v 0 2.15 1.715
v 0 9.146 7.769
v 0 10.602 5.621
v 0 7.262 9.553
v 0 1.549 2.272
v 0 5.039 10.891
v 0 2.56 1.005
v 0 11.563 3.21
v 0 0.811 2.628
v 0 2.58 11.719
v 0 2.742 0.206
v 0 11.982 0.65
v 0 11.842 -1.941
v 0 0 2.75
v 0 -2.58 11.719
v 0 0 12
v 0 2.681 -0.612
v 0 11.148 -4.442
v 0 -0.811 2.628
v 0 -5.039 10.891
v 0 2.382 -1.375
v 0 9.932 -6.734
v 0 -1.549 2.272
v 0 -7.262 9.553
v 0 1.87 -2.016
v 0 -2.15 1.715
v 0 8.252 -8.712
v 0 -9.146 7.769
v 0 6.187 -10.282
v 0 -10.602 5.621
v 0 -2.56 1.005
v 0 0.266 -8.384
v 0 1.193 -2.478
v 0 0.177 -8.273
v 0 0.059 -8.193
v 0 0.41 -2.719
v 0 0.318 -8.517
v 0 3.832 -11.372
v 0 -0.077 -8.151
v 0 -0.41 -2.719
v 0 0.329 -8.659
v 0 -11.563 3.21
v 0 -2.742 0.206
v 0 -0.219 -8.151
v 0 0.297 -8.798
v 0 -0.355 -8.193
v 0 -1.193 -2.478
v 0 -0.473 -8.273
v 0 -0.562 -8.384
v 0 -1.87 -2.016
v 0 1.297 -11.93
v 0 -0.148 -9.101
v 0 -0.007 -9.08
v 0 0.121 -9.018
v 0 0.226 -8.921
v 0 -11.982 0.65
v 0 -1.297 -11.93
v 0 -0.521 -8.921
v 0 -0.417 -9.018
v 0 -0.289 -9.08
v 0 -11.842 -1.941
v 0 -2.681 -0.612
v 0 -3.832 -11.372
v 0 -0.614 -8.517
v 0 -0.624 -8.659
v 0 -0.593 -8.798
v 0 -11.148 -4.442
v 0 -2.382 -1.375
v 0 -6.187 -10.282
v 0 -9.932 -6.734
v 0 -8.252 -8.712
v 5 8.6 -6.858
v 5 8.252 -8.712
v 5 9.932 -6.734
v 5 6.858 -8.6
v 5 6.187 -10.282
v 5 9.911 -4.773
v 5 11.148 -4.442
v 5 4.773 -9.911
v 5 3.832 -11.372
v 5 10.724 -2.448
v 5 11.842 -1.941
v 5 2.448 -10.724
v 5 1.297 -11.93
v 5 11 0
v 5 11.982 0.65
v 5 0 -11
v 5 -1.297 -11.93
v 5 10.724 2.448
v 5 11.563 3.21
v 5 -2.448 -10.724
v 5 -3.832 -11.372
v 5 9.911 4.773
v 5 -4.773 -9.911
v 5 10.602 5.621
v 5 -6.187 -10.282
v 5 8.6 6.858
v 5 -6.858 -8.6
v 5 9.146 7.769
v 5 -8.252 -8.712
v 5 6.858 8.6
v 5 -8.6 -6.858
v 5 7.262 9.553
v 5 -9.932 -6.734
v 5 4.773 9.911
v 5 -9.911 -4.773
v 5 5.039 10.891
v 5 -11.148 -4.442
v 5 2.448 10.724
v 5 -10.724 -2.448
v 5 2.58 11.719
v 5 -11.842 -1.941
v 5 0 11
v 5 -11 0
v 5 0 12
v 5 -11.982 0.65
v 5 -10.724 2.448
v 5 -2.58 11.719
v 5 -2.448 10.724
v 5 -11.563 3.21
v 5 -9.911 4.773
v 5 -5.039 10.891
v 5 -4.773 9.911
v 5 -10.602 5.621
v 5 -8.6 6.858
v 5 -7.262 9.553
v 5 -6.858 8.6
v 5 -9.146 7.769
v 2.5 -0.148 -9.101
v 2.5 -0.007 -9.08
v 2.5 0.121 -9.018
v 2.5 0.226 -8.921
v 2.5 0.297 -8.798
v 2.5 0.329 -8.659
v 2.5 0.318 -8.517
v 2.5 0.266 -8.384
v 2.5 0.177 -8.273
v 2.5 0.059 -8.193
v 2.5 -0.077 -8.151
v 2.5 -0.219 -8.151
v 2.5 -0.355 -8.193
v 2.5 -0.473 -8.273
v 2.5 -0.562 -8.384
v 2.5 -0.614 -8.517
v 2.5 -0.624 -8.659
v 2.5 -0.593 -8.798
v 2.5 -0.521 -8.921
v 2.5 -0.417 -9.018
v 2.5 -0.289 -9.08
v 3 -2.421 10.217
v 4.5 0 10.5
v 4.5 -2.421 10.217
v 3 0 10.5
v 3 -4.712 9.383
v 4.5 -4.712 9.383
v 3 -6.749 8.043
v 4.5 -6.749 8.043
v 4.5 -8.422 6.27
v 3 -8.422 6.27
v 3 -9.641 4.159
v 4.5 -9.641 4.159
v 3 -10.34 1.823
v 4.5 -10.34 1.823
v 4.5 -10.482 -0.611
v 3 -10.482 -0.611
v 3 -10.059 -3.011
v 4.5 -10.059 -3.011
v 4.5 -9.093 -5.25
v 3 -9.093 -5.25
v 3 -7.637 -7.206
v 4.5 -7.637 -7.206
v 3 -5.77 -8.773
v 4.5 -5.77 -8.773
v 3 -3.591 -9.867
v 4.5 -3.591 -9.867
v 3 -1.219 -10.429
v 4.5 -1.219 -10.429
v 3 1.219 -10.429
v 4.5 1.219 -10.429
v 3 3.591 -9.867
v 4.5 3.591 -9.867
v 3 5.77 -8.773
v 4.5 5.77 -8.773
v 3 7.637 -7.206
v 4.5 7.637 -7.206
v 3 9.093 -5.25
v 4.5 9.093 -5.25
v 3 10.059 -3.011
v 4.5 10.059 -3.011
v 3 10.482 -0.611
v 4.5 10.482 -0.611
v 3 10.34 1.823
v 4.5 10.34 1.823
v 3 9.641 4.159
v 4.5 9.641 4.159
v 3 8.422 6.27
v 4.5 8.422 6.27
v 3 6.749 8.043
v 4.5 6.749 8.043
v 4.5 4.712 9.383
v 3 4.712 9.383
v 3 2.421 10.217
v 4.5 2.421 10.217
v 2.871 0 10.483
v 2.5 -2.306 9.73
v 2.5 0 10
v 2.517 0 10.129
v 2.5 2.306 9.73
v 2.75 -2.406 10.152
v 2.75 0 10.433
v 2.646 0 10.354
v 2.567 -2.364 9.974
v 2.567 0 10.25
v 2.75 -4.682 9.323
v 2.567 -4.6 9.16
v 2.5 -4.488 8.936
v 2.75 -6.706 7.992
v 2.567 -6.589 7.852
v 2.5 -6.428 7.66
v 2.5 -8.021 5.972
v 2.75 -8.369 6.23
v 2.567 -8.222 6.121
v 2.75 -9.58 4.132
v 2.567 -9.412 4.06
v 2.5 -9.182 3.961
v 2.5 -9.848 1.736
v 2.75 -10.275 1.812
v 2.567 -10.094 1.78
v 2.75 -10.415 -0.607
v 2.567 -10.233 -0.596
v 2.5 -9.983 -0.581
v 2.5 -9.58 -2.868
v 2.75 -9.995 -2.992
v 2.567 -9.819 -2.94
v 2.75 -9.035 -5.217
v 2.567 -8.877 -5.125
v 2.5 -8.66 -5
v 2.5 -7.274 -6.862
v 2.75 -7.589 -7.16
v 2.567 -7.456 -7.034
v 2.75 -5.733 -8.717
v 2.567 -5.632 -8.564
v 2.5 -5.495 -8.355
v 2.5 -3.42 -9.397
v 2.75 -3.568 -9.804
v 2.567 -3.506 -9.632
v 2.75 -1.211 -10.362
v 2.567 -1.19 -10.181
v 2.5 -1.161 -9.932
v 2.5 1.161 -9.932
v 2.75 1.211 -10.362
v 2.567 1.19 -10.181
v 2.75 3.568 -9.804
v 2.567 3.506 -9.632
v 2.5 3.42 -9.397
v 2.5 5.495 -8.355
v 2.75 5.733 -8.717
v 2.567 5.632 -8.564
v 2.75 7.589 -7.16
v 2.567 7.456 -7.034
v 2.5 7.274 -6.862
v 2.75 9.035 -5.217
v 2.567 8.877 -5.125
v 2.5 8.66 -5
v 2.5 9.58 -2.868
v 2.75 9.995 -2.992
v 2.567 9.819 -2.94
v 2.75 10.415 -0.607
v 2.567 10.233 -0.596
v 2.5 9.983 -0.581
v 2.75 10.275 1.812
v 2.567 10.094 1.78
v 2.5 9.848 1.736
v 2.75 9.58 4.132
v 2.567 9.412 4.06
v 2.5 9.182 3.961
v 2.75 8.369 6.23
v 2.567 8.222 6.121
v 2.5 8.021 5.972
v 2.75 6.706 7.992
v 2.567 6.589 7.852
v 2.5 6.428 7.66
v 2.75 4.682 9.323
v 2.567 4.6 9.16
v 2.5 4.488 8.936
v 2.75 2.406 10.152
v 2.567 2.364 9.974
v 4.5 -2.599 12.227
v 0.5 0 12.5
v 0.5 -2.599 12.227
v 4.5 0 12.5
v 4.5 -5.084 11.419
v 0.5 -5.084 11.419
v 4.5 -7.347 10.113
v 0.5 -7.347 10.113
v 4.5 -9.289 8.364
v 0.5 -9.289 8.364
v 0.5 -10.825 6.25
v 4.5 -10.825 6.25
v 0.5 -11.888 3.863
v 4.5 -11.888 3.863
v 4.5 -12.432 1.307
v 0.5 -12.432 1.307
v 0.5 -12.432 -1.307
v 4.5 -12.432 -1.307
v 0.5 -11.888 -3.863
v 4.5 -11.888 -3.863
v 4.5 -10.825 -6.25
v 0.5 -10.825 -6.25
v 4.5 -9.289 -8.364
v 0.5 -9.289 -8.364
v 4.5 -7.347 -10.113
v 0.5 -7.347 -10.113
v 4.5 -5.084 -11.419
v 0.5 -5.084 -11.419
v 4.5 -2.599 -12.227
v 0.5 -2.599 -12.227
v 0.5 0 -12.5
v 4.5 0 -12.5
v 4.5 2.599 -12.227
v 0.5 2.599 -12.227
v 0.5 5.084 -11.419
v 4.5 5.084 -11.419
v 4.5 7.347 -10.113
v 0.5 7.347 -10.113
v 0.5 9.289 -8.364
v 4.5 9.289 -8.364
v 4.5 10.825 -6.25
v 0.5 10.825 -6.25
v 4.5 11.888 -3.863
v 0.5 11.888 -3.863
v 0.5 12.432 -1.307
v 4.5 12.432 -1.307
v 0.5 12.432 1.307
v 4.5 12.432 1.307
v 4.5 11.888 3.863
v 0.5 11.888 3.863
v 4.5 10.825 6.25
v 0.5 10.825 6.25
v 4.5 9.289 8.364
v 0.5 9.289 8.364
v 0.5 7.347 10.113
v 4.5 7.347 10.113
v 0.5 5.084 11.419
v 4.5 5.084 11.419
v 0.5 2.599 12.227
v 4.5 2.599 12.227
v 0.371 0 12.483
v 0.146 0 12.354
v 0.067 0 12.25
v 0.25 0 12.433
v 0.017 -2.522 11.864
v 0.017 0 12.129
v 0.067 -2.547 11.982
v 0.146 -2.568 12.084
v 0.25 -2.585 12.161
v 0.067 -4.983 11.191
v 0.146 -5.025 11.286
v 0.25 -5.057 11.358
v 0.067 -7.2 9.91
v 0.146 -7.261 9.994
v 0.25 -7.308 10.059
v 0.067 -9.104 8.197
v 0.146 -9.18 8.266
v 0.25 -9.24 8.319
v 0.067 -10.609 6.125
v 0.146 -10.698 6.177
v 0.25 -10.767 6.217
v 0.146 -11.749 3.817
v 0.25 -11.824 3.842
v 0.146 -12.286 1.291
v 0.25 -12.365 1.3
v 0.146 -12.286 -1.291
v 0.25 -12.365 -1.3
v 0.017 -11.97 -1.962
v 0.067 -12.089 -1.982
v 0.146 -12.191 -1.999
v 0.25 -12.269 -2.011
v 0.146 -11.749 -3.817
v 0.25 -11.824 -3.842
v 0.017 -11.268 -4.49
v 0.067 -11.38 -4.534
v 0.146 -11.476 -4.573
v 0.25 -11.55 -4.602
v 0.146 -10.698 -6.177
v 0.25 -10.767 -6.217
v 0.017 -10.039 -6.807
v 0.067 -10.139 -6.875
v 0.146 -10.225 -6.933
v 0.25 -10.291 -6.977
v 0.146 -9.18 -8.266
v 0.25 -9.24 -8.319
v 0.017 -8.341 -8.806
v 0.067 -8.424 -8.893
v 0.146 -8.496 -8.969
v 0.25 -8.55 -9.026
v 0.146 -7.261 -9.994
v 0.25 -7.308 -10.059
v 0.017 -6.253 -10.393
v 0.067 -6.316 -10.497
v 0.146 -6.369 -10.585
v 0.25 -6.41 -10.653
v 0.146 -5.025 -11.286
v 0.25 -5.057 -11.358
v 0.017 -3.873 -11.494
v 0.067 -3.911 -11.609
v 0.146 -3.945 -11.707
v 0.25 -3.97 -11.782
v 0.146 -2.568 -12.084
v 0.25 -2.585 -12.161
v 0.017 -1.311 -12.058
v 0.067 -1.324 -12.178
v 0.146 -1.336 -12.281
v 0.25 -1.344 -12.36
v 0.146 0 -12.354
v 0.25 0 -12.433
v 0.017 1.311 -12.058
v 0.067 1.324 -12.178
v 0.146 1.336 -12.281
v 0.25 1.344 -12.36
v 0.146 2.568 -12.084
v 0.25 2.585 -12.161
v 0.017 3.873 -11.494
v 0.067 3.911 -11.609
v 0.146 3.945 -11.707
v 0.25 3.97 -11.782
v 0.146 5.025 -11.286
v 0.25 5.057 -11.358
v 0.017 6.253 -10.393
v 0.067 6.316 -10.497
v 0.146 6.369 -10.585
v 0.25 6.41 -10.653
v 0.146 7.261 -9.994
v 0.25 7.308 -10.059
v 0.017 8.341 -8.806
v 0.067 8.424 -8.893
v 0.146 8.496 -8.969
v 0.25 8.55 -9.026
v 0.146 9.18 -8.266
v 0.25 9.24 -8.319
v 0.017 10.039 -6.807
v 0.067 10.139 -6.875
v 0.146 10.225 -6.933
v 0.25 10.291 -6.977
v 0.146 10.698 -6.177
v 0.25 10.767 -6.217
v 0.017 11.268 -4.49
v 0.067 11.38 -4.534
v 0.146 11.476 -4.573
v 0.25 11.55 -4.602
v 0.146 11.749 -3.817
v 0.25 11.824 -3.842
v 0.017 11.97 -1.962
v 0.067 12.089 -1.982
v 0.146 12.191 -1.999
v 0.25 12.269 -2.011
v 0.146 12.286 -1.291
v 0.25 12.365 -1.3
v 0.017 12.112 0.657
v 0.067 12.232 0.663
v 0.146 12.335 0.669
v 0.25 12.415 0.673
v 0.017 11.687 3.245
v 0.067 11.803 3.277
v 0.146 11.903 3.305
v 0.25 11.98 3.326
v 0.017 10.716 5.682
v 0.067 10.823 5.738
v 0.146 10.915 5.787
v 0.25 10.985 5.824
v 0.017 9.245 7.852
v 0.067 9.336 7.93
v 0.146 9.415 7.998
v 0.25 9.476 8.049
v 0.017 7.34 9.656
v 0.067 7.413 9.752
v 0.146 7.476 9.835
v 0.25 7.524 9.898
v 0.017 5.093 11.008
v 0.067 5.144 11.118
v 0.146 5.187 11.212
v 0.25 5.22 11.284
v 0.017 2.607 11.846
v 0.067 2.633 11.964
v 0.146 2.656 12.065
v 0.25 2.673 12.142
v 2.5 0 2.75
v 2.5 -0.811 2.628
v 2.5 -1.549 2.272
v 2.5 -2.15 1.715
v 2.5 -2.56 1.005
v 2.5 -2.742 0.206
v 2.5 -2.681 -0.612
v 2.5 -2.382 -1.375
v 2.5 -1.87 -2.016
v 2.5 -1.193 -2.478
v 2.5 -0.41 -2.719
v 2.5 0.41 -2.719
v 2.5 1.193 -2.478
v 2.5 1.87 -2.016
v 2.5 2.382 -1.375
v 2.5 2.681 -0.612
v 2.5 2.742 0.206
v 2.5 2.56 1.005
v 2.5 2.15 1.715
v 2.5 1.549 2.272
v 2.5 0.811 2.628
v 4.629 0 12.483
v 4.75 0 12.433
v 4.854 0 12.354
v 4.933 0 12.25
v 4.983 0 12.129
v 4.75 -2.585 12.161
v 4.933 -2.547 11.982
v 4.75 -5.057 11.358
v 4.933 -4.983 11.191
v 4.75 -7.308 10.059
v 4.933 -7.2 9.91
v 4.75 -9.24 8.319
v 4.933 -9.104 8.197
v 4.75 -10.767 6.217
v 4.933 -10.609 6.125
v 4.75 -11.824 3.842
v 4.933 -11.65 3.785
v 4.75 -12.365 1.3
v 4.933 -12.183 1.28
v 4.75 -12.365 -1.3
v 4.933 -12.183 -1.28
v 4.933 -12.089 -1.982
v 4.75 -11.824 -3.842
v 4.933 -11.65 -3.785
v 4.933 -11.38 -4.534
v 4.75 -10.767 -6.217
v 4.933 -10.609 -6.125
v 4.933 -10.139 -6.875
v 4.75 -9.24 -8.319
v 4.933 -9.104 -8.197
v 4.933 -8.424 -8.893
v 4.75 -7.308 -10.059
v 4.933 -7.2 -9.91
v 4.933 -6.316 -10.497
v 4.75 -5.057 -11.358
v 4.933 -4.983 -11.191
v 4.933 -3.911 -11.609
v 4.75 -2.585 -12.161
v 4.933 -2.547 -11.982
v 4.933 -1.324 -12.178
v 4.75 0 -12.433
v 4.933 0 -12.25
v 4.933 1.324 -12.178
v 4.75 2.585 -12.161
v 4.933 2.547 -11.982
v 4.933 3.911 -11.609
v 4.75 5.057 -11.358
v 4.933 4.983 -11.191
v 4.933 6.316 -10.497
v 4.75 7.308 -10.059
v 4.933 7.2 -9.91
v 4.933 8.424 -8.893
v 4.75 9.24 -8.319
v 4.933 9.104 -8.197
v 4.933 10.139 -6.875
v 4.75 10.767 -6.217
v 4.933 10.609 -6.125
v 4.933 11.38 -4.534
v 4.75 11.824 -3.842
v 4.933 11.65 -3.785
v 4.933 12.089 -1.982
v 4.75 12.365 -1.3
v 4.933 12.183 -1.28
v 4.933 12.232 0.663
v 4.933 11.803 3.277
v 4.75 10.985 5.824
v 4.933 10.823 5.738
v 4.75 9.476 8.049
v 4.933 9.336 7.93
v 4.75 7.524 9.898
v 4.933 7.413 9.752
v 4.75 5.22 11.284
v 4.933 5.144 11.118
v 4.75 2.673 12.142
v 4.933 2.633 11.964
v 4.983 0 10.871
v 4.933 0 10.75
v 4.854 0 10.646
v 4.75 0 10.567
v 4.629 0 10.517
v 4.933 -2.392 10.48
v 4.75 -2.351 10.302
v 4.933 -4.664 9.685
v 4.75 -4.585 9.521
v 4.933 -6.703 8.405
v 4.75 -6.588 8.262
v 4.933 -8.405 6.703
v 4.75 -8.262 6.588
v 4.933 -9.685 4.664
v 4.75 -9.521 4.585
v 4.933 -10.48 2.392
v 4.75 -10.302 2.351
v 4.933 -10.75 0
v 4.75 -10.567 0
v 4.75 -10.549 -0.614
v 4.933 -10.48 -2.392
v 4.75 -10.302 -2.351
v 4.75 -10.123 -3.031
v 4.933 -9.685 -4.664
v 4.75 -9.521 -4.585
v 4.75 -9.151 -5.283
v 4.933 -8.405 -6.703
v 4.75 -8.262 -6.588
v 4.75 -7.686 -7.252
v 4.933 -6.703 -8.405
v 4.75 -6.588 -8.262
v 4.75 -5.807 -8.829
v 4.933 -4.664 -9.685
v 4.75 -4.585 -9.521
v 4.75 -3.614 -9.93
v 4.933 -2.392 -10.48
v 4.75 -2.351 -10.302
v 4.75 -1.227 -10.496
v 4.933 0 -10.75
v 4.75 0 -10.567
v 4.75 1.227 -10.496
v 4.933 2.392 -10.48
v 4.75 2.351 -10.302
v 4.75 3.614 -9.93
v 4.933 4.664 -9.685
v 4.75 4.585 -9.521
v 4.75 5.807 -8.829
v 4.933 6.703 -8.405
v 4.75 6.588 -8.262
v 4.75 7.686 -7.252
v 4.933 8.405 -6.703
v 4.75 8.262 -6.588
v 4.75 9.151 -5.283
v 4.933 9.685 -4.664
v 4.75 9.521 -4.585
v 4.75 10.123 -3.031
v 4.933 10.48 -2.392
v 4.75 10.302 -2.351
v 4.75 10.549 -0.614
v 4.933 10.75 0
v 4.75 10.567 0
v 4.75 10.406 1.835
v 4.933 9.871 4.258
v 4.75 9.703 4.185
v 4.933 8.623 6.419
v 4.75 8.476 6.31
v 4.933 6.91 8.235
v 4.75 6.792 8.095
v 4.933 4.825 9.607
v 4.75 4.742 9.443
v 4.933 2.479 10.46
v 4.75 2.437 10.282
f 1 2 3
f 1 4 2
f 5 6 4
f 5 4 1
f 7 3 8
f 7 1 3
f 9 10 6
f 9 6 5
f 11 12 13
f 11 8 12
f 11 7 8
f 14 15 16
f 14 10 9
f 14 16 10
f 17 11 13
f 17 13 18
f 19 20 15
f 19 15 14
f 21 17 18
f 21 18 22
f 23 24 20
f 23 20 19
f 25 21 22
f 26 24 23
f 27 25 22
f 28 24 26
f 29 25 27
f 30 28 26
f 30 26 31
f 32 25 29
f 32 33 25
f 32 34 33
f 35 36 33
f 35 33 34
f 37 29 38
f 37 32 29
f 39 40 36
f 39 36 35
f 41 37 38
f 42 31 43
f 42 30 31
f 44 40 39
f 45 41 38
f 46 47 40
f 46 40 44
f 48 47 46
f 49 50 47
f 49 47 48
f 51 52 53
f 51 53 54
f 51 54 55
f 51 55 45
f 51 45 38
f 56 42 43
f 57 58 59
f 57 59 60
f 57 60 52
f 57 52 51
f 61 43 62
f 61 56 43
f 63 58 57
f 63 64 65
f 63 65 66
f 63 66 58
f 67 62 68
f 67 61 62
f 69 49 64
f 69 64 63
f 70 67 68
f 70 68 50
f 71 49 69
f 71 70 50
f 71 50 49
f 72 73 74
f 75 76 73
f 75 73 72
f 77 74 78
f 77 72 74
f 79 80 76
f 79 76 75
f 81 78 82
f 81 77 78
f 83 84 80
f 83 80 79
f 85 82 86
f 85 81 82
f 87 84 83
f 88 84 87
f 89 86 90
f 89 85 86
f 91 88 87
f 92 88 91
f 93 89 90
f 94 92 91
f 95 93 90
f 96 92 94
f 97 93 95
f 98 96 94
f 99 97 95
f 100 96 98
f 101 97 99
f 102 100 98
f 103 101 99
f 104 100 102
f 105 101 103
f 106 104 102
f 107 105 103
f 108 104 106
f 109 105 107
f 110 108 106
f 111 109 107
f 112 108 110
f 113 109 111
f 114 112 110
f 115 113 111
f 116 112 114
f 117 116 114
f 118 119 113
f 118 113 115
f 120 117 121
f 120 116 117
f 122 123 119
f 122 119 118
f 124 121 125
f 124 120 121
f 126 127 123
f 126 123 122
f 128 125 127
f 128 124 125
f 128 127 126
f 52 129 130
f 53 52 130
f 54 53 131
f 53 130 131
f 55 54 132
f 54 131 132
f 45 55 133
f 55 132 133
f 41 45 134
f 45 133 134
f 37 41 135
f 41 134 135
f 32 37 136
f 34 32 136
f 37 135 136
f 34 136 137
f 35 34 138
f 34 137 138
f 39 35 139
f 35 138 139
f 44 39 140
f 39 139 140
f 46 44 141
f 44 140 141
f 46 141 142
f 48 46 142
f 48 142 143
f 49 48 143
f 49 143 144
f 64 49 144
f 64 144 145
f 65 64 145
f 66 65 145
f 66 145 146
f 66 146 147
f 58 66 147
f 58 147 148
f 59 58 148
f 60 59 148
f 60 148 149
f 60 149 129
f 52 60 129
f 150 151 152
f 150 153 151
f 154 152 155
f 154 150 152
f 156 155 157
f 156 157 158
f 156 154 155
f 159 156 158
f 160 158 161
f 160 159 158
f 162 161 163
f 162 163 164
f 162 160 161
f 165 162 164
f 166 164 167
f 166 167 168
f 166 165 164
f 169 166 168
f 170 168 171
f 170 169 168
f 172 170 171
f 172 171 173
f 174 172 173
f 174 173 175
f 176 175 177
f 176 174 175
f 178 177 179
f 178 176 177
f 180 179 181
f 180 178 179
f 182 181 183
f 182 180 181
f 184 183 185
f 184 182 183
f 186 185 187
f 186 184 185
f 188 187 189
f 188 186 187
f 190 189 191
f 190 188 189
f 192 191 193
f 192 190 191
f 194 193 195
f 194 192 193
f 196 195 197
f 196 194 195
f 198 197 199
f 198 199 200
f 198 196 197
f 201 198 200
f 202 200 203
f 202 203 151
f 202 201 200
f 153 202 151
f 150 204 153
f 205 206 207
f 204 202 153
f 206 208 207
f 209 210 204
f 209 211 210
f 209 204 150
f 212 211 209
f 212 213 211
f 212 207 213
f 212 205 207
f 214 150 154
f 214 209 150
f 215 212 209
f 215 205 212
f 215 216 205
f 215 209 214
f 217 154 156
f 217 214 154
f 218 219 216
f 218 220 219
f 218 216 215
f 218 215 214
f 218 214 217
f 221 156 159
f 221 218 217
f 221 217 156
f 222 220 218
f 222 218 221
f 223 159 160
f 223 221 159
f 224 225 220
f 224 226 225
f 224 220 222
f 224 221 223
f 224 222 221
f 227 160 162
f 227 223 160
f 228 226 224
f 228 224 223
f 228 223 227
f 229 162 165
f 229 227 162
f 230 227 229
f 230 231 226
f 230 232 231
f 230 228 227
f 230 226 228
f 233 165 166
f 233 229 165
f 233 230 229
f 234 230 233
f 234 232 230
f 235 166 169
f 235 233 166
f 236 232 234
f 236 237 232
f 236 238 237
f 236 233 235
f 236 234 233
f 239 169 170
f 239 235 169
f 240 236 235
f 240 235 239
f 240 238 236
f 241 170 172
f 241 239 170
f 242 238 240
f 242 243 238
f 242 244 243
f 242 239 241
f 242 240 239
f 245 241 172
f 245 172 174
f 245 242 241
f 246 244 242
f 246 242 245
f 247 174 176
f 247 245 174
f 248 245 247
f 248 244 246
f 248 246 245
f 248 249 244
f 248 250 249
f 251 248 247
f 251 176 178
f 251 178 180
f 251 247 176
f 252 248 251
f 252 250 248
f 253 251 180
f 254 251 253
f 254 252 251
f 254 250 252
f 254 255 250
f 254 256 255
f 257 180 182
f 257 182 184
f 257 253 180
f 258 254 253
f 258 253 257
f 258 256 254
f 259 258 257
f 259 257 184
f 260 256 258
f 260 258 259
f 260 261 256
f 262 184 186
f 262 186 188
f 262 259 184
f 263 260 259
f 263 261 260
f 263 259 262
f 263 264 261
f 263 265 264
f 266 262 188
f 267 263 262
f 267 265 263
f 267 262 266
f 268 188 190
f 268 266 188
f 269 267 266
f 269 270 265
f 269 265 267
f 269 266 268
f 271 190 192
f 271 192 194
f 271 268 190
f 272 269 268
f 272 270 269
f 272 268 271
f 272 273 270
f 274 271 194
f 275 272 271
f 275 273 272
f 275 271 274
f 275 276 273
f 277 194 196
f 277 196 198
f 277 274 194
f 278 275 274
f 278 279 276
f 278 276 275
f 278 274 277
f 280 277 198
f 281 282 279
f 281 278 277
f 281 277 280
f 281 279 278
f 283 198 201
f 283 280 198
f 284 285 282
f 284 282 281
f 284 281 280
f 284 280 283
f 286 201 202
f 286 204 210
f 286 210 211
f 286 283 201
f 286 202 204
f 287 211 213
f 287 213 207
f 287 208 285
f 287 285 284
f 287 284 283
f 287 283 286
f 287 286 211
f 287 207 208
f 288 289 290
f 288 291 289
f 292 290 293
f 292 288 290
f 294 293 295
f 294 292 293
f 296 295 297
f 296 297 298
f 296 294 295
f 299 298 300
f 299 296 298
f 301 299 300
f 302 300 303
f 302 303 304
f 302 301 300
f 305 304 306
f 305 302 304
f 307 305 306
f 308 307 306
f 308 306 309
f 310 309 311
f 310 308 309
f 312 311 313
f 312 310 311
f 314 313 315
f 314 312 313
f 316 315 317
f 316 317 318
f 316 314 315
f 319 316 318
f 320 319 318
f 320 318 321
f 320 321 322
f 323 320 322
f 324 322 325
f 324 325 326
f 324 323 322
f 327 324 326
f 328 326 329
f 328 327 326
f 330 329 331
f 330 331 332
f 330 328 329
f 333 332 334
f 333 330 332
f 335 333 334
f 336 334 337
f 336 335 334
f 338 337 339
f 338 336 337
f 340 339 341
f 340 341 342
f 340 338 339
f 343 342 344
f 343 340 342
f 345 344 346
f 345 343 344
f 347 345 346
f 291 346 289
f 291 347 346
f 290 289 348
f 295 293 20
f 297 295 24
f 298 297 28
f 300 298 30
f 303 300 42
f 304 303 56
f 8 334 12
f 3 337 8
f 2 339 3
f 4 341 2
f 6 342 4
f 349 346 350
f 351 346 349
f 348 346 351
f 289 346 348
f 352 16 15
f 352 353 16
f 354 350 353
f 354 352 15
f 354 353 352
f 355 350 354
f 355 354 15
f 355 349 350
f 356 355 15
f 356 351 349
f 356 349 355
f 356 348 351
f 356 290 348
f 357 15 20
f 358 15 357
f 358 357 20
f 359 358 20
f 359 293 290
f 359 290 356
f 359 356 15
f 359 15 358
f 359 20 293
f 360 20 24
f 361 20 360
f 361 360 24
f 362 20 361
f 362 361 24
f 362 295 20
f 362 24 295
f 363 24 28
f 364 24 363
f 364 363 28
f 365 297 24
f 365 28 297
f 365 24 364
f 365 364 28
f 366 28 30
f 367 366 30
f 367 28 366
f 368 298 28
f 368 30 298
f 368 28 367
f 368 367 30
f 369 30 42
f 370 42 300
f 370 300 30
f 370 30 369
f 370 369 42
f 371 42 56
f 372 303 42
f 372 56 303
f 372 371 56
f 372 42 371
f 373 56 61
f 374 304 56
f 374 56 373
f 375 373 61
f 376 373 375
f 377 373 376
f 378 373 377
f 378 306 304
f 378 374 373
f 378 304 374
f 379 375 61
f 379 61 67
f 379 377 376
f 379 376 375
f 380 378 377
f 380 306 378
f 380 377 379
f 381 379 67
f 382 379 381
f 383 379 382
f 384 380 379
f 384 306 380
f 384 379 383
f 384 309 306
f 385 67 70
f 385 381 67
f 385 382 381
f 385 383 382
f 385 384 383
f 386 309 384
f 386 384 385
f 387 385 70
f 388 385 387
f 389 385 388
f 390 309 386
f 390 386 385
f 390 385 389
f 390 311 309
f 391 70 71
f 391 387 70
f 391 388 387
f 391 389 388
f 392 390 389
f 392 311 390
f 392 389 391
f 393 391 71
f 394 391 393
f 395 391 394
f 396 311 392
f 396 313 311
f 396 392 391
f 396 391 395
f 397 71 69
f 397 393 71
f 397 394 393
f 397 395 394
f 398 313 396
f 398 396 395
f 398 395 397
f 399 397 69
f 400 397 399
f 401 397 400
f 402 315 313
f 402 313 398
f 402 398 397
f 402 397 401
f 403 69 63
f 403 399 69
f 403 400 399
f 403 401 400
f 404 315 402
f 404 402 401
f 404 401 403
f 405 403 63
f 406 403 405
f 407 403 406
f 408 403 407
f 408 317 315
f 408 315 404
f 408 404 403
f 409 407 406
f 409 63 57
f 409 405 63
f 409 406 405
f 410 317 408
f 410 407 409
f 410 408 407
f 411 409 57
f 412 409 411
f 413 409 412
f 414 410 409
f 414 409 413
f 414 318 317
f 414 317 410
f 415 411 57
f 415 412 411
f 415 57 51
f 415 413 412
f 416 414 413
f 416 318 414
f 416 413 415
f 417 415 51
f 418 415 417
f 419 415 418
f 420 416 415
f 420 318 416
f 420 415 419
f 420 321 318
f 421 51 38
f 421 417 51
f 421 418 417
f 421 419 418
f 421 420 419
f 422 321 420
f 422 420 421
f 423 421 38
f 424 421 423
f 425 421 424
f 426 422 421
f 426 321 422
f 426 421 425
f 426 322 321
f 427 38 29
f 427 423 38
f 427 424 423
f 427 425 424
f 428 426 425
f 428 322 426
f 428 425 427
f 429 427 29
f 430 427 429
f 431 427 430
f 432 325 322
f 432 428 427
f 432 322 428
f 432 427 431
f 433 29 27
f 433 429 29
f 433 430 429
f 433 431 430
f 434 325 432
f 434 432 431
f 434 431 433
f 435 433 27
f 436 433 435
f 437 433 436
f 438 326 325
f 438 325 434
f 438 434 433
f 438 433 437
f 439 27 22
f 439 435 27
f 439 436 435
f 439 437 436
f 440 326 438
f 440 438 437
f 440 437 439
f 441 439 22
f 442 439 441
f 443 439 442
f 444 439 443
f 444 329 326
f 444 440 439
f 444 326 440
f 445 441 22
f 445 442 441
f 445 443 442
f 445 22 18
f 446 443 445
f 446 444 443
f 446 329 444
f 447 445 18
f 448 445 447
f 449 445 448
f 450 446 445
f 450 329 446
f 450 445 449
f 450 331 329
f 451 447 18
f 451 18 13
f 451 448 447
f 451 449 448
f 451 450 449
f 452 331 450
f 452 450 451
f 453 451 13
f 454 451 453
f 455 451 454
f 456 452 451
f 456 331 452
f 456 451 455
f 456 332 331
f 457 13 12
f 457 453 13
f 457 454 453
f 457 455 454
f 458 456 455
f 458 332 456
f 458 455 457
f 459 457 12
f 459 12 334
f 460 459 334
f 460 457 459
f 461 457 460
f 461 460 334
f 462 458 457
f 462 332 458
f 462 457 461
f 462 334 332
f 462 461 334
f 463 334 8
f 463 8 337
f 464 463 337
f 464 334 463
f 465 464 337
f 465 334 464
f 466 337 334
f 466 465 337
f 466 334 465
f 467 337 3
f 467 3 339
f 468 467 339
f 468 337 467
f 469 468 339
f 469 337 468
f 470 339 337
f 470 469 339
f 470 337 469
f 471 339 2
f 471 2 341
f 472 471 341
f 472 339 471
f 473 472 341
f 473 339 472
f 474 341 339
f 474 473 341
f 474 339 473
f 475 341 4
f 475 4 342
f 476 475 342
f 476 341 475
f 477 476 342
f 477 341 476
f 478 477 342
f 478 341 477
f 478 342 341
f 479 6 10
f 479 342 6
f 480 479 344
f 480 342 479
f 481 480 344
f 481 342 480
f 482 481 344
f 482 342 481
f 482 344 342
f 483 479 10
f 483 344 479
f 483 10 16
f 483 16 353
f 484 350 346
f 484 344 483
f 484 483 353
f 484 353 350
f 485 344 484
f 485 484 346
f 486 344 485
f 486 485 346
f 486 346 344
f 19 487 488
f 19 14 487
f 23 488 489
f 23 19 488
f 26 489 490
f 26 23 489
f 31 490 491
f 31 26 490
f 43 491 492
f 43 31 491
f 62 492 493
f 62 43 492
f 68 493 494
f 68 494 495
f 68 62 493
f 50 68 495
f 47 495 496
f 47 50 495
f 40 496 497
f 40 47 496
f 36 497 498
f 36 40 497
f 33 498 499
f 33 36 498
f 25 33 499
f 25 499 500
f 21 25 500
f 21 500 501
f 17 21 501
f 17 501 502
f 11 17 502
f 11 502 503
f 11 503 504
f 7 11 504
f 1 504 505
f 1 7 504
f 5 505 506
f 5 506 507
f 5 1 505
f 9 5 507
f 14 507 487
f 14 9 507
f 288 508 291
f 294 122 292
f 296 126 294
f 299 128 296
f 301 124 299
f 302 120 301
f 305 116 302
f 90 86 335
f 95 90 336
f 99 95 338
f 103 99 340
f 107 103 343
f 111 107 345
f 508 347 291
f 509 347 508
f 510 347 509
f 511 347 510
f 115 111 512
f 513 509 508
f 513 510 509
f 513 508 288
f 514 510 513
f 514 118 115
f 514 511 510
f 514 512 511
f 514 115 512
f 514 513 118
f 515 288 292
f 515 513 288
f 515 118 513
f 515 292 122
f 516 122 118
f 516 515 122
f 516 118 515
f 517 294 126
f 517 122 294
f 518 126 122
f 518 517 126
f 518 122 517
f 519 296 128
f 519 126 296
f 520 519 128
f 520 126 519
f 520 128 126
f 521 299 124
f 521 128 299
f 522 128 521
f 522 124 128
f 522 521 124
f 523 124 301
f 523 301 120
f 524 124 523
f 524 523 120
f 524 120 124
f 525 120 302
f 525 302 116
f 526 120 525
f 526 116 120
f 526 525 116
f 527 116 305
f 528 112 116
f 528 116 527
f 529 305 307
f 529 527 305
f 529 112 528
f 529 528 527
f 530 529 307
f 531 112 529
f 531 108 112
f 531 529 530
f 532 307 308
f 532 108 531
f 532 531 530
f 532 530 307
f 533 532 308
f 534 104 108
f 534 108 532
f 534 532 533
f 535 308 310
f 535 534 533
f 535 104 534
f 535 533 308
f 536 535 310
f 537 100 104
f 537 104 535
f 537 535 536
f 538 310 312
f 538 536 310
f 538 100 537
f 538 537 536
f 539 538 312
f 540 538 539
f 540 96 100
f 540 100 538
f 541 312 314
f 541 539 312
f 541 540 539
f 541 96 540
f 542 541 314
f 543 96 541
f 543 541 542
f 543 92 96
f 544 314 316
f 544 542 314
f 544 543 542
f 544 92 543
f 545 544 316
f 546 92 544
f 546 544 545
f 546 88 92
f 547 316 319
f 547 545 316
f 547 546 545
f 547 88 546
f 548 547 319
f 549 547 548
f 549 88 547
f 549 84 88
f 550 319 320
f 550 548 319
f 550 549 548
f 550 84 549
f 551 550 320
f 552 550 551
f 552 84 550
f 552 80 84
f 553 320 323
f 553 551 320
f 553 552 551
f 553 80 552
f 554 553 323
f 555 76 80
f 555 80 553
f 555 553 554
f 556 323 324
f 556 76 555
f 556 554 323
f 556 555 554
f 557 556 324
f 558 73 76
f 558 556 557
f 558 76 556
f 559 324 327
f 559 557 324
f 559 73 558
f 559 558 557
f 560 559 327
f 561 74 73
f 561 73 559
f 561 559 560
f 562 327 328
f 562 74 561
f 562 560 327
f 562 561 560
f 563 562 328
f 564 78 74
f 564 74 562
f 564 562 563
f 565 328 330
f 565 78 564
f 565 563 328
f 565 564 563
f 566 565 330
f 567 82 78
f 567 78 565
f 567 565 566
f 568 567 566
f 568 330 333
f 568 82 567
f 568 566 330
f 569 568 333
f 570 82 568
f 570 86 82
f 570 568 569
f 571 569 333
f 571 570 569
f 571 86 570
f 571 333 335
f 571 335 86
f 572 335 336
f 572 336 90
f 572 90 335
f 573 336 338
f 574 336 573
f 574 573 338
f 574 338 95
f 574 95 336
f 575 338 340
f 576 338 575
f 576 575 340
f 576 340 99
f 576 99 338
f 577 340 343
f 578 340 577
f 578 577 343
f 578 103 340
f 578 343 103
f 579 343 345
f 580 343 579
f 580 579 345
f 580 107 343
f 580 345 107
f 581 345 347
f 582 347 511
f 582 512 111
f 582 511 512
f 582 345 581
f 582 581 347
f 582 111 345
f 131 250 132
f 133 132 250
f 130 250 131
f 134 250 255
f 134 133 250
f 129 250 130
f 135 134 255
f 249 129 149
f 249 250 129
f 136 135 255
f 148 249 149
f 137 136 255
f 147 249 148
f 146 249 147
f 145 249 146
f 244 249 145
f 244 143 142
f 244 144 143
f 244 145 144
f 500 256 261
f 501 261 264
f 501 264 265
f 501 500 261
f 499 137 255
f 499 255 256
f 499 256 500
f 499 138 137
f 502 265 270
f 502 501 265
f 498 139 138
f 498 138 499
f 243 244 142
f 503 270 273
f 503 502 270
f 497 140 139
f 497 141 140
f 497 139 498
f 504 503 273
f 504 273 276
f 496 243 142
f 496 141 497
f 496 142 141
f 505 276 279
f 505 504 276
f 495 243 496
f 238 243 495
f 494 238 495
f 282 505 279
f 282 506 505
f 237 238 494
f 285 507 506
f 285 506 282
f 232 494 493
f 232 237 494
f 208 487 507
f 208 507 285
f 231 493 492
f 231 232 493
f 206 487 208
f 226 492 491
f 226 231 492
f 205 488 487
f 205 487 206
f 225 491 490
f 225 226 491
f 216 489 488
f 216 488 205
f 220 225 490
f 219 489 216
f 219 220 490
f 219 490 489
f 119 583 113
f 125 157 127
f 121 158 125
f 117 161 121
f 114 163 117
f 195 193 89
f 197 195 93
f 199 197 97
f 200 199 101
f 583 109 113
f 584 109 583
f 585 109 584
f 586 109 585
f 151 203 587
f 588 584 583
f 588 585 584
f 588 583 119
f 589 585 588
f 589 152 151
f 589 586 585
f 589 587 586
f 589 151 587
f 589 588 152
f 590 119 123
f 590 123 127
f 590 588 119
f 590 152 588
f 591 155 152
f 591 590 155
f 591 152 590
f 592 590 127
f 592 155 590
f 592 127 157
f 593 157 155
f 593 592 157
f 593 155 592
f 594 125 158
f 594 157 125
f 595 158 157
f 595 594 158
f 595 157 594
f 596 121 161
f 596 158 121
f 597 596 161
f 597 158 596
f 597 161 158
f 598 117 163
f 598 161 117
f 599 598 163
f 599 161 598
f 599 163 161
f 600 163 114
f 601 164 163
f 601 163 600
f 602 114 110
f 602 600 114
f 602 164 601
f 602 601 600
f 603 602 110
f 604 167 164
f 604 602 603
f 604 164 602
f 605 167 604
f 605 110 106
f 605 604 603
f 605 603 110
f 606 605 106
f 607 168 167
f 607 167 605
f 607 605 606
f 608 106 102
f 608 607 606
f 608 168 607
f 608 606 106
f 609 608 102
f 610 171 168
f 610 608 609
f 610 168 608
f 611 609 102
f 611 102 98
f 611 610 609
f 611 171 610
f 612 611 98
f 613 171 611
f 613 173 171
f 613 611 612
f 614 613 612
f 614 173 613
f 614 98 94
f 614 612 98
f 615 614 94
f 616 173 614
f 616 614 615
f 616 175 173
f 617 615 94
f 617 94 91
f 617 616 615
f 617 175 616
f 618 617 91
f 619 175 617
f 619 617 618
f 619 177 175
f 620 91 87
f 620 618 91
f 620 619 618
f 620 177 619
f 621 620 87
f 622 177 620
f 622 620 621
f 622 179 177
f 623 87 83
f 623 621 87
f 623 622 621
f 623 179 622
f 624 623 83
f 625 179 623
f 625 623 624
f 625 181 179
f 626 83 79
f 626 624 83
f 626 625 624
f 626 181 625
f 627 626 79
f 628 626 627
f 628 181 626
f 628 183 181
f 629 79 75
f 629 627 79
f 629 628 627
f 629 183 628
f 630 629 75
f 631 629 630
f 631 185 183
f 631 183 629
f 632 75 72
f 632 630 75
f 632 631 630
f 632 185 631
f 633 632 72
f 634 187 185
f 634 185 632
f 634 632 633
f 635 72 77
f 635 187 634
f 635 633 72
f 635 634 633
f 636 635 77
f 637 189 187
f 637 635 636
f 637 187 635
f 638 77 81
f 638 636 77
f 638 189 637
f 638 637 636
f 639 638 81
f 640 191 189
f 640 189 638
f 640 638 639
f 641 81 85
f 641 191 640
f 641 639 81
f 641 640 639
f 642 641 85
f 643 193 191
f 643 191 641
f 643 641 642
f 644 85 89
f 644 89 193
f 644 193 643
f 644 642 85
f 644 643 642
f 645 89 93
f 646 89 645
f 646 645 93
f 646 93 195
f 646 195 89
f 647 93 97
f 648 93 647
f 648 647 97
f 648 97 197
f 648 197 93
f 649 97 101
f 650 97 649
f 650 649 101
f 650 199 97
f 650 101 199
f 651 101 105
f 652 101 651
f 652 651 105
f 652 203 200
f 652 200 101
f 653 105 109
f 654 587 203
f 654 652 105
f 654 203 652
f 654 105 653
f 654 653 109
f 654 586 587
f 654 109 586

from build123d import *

# Parameters (mm, degrees)
CUT_EXTRUDE1_REACH = 19.854
SKETCH4_R          = 0.477810363


with BuildPart() as part:
    # Sketch2 → Revolve1 (revolve)
    with BuildSketch(Plane.XY, mode=Mode.PRIVATE) as revolve1_sk:
        with BuildLine():
            Line((0, 2.75), (0, 12))
            ThreePointArc((0, 12), (0.146446609, 12.353553391), (0.5, 12.5))
            Line((0.5, 12.5), (4.5, 12.5))
            ThreePointArc((4.5, 12.5), (4.853553391, 12.353553391), (5, 12))
            Line((5, 12), (5, 11))
            ThreePointArc((5, 11), (4.853553391, 10.646446609), (4.5, 10.5))
            Line((4.5, 10.5), (3, 10.5))
            ThreePointArc((3, 10.5), (2.646446609, 10.353553391), (2.5, 10))
            Line((2.5, 10), (2.5, 2.75))
            Line((2.5, 2.75), (0, 2.75))
        make_face()
    revolve(revolve1_sk.sketch.rotate(Axis((0, 0, 0), (1, 0, 0)), 90), axis=Axis((0, 0, 0), (1, 0, 0)))

    # Sketch4 → Cut-Extrude1 (cut, up to next)
    with BuildSketch(Plane(origin=(2.5, 0, 0), x_dir=(0, 0, -1), z_dir=(1, 0, 0)), mode=Mode.PRIVATE) as cut_extrude1_sk1:
        with Locations((8.623339412, -0.147893684)):
            Circle(SKETCH4_R)
    cut_extrude1_tool1 = extrude(cut_extrude1_sk1.sketch, amount=-CUT_EXTRUDE1_REACH, mode=Mode.PRIVATE) & part.part
    add(cut_extrude1_tool1.solids().sort_by_distance((2.5, -0.147894, -8.623339))[0], mode=Mode.SUBTRACT)


solid = part.part
